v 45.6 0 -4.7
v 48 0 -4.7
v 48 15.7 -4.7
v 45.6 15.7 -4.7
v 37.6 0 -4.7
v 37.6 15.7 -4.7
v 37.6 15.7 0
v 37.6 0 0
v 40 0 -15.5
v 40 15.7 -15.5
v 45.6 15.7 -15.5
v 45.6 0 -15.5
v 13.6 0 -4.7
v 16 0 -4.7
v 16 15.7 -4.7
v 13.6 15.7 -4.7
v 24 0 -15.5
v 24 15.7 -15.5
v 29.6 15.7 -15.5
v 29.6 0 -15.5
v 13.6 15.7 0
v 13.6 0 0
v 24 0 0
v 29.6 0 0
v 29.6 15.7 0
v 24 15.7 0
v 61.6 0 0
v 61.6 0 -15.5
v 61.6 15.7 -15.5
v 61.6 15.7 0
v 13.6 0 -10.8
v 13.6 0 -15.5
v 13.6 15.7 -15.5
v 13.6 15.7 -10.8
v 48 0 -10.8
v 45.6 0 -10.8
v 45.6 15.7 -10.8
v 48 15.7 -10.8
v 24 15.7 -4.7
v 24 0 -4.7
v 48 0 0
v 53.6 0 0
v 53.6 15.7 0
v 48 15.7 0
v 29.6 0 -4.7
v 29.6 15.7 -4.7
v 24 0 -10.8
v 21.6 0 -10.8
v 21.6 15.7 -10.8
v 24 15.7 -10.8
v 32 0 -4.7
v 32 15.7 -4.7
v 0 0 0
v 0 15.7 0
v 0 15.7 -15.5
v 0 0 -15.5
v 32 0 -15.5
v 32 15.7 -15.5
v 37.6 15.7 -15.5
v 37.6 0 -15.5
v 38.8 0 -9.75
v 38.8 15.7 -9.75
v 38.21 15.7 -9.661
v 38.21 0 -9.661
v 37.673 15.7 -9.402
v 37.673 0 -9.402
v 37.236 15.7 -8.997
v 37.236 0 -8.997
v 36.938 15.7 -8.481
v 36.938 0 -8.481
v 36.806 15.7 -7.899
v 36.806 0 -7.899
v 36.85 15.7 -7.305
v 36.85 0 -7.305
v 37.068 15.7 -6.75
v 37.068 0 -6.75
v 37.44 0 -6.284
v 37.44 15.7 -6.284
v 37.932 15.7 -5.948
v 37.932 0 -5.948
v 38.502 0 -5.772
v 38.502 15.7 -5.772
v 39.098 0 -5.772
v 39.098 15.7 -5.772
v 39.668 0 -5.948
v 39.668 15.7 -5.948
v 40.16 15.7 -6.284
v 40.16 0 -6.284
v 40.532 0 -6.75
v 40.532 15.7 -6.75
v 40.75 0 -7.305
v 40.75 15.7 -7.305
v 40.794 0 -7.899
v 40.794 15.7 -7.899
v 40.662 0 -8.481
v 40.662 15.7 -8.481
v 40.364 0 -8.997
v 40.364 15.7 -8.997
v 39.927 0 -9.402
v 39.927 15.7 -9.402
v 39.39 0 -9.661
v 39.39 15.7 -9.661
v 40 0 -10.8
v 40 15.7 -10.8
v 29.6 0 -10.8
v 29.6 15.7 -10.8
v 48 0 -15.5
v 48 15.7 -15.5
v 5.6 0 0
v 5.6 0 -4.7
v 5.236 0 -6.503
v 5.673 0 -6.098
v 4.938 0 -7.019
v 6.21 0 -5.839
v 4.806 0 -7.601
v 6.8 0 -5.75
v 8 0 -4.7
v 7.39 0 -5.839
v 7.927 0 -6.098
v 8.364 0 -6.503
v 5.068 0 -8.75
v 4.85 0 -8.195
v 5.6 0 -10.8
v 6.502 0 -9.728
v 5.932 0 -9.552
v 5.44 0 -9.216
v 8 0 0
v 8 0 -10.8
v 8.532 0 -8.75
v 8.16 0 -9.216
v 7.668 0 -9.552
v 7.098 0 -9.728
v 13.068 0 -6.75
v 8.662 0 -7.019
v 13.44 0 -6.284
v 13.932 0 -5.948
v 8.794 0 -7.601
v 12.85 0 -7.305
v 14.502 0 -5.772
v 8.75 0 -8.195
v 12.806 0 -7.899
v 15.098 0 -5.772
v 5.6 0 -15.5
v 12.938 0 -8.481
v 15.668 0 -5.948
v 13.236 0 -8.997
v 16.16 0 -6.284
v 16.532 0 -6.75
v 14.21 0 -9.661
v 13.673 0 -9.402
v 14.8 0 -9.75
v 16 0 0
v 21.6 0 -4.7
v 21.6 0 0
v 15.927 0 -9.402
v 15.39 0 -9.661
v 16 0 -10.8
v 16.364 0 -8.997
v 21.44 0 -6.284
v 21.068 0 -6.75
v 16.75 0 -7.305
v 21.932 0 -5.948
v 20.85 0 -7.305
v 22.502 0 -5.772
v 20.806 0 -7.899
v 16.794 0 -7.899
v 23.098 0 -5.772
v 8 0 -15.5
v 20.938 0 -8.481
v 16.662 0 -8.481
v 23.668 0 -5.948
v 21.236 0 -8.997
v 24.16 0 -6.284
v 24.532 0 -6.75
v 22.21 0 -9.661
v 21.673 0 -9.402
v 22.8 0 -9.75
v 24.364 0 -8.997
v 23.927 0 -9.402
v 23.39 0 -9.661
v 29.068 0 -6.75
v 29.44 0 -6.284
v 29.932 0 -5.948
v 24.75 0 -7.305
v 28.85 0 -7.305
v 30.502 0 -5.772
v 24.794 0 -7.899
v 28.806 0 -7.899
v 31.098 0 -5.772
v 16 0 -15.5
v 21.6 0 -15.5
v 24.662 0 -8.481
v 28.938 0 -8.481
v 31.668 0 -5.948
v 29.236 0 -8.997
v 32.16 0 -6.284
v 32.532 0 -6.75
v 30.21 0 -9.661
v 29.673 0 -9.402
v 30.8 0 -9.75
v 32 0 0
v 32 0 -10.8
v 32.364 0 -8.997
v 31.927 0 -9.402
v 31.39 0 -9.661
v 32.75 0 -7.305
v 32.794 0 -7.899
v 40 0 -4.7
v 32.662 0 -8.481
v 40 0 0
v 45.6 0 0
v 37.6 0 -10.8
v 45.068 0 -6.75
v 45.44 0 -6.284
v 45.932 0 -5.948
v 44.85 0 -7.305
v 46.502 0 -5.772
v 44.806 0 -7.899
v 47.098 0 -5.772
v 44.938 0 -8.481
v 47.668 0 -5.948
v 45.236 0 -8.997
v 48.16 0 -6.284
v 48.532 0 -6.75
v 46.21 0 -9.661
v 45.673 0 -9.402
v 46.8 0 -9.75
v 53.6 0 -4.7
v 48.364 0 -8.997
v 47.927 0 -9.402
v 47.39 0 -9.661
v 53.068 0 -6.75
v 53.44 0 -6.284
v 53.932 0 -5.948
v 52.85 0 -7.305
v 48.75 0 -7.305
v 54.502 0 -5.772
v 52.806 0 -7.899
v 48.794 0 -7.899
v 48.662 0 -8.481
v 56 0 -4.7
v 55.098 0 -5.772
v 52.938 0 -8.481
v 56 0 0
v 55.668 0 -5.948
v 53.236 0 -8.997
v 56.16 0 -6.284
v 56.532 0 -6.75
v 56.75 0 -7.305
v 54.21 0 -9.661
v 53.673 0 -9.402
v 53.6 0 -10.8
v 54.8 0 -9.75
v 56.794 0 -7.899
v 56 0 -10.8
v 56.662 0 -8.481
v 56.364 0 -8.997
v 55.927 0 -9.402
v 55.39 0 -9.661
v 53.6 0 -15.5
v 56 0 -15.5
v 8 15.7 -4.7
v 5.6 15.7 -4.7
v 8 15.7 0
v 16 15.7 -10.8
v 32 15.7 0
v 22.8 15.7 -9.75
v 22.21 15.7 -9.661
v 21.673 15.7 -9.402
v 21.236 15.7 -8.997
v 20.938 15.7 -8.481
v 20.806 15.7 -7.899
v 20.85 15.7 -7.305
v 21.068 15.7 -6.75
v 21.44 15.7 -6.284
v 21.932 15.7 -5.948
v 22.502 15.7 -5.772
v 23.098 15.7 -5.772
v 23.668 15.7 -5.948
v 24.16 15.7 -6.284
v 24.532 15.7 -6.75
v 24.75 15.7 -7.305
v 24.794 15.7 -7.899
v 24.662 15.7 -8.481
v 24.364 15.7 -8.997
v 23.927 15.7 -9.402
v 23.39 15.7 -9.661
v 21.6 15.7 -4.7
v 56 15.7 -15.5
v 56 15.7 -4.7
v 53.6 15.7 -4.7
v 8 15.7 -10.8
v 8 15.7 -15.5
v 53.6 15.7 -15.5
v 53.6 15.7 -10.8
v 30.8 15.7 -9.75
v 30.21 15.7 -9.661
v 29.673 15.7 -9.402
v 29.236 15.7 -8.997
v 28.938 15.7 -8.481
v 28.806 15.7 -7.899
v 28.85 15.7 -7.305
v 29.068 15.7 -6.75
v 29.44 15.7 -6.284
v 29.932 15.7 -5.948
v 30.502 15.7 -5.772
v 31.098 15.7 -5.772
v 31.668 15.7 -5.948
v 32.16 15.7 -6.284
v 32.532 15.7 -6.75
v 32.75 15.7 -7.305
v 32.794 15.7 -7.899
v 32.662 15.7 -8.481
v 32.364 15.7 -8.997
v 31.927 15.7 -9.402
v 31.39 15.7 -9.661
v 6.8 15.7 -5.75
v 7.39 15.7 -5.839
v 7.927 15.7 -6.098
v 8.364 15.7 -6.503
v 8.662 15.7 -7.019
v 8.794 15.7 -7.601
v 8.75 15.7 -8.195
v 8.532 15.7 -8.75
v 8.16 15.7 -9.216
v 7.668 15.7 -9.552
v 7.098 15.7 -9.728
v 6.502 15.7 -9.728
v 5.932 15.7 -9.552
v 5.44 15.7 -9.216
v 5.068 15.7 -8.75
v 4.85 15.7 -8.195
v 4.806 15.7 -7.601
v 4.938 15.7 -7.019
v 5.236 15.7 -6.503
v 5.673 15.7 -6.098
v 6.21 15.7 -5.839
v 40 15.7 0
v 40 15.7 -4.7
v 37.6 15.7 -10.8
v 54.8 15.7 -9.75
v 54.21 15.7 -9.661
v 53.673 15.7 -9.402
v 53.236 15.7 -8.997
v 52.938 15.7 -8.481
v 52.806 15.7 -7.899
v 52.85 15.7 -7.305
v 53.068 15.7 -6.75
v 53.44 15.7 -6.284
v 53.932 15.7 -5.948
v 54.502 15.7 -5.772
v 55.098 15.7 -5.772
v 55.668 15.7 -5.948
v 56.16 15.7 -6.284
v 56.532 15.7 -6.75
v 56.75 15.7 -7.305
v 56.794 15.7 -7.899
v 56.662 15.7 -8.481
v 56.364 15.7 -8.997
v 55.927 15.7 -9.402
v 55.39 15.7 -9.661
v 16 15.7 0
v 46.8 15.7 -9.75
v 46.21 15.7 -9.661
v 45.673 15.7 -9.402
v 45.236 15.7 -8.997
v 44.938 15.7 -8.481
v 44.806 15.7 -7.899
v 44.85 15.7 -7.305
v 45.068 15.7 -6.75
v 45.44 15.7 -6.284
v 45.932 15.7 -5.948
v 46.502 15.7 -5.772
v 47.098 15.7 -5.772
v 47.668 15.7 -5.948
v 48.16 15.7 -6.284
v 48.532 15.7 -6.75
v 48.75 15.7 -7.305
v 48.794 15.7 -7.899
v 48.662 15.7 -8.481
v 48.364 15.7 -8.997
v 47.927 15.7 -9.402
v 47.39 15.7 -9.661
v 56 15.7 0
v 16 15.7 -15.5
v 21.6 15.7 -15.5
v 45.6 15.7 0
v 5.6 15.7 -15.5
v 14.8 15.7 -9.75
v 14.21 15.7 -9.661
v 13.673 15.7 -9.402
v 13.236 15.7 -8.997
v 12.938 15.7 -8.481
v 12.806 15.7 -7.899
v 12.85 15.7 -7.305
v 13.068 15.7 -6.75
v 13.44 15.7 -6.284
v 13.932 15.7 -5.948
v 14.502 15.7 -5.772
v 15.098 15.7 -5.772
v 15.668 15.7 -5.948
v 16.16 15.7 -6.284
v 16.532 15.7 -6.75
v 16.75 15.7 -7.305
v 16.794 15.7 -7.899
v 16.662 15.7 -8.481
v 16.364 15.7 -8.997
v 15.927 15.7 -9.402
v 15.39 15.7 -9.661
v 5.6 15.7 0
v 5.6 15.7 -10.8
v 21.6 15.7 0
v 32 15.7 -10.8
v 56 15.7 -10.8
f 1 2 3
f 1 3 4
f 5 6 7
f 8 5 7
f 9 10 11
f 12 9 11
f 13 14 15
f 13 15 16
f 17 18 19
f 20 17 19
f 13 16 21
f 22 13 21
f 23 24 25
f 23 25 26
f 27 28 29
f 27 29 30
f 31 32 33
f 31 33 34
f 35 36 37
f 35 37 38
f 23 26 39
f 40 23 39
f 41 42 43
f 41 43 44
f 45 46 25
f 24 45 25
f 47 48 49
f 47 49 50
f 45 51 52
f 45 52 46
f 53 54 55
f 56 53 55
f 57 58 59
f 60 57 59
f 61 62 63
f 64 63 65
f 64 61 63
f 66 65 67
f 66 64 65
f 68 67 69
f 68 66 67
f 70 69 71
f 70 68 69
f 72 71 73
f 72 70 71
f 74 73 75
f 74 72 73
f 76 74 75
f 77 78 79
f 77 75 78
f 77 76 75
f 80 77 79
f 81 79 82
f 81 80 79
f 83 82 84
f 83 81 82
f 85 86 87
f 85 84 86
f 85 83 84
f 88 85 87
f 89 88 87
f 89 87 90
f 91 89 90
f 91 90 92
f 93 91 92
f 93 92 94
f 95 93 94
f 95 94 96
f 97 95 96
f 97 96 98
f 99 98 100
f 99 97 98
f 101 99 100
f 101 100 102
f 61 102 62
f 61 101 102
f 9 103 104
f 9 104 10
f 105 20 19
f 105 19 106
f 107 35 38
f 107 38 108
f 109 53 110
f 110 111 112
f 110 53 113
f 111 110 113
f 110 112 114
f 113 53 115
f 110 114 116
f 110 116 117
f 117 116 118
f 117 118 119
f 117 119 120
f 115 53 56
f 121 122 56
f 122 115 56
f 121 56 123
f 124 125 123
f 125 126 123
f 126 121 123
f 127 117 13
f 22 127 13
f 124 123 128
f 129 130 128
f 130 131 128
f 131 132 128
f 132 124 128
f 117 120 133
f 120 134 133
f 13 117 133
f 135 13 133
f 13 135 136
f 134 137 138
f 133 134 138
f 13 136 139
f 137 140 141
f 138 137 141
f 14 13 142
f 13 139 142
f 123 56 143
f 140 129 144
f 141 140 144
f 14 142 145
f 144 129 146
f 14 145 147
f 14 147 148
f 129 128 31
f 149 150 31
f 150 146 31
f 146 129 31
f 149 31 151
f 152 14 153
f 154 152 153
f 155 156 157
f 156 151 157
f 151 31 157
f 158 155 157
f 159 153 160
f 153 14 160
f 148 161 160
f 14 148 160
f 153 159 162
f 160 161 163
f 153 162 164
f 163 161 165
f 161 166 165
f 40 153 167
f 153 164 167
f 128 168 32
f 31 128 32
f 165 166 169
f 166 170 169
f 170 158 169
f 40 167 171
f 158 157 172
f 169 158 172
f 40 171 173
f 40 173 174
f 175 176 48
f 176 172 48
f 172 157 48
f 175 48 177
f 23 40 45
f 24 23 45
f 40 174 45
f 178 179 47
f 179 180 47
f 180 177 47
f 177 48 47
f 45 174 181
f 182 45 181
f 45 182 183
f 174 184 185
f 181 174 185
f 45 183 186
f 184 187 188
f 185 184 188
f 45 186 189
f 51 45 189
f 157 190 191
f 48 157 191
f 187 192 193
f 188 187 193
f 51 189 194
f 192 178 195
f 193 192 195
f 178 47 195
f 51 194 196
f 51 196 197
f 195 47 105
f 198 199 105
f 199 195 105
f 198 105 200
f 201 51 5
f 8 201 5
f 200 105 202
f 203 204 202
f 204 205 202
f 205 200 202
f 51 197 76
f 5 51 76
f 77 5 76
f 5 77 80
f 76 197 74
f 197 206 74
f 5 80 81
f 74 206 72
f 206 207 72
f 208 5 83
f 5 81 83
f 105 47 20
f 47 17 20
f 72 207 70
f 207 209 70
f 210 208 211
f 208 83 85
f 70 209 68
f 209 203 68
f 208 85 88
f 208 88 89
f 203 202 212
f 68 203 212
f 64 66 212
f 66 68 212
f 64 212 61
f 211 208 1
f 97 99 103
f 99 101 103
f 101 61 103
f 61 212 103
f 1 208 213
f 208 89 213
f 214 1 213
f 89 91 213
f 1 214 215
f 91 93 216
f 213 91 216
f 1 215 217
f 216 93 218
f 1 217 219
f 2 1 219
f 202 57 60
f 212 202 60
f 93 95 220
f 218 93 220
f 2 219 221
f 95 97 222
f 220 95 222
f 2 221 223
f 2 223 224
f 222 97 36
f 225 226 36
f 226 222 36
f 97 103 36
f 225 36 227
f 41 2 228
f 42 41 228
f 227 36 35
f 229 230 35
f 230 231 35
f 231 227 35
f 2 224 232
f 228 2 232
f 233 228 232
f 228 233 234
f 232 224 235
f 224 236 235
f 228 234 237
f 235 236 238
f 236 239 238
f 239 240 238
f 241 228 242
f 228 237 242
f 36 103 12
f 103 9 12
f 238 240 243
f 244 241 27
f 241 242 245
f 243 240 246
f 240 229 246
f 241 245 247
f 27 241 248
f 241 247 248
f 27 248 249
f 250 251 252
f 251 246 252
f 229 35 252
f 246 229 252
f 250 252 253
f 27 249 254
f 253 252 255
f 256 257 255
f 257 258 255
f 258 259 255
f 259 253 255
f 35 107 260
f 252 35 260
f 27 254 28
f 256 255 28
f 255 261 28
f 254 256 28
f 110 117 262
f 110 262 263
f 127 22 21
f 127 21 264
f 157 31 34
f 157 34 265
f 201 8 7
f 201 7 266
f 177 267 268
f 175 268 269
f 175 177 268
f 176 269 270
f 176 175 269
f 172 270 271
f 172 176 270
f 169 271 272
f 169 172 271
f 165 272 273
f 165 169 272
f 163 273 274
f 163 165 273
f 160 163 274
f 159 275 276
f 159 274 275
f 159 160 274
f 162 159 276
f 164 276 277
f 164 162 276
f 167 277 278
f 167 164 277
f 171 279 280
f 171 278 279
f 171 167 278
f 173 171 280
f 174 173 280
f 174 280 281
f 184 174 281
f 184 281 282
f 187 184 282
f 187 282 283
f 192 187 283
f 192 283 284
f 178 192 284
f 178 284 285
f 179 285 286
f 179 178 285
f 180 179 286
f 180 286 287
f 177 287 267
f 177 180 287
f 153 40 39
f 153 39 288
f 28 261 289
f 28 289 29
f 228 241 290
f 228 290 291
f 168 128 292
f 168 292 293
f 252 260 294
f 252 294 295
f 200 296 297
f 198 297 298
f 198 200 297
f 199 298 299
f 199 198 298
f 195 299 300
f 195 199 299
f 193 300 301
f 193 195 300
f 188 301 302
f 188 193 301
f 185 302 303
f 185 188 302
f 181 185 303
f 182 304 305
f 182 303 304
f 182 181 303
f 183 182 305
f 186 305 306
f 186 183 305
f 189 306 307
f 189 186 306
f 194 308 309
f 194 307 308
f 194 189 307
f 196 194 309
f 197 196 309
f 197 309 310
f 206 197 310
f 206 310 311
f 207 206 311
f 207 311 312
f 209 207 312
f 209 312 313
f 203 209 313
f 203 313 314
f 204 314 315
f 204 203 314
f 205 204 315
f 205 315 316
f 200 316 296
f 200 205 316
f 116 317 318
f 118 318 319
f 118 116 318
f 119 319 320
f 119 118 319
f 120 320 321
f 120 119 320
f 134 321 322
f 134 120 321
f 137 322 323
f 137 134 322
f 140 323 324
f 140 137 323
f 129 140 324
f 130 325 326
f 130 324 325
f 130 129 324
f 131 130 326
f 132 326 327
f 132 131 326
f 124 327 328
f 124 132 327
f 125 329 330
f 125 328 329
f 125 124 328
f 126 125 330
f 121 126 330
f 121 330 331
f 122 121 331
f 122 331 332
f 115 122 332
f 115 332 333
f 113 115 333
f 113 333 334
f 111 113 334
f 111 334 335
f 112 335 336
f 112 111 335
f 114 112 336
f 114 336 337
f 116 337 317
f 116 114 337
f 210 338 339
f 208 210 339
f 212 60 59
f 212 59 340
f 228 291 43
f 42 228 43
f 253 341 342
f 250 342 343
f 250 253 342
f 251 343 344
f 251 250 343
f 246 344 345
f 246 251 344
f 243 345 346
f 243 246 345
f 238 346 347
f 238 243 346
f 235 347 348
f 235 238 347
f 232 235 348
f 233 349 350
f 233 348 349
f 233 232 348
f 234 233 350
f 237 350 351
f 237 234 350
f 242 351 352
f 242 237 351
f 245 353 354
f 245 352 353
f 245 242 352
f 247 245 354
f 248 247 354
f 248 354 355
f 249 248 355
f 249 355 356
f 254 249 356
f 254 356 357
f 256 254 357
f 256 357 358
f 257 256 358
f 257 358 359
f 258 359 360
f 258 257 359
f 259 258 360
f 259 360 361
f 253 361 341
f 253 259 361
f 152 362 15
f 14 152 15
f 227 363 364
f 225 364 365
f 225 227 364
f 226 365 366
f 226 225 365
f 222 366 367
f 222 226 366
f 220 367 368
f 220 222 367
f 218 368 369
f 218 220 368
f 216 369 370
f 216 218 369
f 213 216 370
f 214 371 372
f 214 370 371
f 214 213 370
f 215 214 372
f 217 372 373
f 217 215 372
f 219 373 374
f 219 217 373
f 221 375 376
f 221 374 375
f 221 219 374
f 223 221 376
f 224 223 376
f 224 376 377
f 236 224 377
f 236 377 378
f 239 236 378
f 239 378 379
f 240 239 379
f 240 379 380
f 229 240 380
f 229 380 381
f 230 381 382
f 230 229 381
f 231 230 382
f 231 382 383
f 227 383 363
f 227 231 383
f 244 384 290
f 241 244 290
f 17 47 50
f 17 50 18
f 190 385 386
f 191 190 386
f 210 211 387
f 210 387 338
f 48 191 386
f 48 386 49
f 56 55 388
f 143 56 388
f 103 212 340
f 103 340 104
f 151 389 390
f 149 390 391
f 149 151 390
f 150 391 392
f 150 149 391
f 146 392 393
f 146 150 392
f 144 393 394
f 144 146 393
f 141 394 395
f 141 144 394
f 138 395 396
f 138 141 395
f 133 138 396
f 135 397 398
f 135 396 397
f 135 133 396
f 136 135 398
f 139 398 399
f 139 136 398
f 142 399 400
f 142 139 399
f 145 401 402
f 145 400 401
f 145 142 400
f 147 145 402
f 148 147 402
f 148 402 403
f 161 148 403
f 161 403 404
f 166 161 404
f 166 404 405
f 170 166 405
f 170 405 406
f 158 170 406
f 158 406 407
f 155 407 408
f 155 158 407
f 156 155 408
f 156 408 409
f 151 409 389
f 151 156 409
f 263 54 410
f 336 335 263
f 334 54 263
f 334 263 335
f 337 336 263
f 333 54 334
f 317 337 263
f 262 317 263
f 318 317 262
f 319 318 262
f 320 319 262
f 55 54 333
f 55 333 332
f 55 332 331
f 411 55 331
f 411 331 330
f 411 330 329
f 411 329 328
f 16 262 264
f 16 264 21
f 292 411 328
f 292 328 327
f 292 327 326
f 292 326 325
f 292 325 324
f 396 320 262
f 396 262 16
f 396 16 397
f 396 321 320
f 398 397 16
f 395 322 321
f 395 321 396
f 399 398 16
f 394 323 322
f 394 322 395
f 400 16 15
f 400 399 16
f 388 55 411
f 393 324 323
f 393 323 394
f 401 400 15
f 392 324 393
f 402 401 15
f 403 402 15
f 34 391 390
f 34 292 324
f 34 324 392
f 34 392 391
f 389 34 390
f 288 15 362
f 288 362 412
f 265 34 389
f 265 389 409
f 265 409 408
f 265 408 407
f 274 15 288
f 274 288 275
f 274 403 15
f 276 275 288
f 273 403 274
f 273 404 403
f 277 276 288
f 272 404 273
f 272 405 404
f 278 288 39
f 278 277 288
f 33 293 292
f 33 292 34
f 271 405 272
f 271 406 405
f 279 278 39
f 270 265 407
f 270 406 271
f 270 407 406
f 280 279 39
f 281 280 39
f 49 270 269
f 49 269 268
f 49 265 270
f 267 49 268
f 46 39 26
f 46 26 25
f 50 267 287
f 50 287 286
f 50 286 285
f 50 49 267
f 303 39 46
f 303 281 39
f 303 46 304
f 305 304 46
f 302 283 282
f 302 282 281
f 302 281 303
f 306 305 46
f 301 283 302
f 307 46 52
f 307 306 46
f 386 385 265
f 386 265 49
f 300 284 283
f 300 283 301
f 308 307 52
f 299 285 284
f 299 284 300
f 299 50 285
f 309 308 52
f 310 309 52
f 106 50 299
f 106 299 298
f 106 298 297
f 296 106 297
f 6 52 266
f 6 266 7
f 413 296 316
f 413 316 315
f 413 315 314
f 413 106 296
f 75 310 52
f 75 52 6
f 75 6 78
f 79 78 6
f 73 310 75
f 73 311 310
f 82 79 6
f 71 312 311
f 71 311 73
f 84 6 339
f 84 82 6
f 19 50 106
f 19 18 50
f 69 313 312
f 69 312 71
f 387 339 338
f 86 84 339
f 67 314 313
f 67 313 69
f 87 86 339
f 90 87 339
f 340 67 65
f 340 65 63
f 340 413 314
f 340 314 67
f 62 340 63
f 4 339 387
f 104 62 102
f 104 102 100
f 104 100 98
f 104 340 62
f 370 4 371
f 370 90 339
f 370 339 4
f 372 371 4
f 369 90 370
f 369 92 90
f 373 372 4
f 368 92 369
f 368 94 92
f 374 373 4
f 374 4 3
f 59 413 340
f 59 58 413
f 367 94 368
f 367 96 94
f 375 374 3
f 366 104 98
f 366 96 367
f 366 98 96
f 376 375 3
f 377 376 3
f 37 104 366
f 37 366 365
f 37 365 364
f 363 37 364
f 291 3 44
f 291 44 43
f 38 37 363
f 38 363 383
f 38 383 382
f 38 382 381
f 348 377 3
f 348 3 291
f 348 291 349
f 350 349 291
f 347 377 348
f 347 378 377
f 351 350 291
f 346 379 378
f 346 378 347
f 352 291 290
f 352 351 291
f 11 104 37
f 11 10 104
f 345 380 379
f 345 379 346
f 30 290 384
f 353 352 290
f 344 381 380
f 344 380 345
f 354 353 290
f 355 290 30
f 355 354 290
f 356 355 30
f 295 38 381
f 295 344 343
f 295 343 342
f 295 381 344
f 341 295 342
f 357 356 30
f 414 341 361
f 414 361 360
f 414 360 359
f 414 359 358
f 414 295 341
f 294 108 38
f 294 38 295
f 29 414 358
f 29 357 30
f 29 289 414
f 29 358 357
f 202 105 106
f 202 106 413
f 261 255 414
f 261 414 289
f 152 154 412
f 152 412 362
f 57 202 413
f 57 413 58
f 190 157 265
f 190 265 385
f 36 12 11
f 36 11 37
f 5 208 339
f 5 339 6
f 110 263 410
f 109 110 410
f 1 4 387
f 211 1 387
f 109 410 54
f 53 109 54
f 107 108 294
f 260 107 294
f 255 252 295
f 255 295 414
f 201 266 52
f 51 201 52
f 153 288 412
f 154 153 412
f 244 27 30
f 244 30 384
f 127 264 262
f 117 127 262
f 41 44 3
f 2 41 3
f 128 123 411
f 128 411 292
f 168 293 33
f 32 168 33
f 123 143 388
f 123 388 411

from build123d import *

# Parameters (mm, degrees)
BOSS_EXTRUDE1_DEPTH = 15.7
LPATTERN1_COUNT     = 8
LPATTERN1_PITCH     = 8
SKETCH2_W           = 1.2
SKETCH2_H           = 6.1
CUT_EXTRUDE1_DEPTH  = 67.562602113
SKETCH3_W           = 0.8
SKETCH3_H           = 3.2
BOSS_EXTRUDE2_DEPTH = 15.7


with BuildPart() as part:
    # Sketch1 → Boss-Extrude1 (new body)
    with BuildSketch(Plane(origin=(0, 0, 0), x_dir=(1, 0, 0), z_dir=(0, 1, 0))):
        with BuildLine():
            Line((0, 10.8), (0, 15.5))
            Line((0, 15.5), (5.6, 15.5))
            Line((5.6, 15.5), (5.6, 10.8))
            Line((5.6, 10.8), (6.8, 10.8))
            Line((6.8, 10.8), (6.8, 9.75))
            ThreePointArc((6.8, 9.75), (4.8, 7.75), (6.8, 5.75))
            Line((6.8, 5.75), (6.8, 4.7))
            Line((6.8, 4.7), (5.6, 4.7))
            Line((5.6, 4.7), (5.6, 0))
            Line((5.6, 0), (0, 0))
            Line((0, 0), (0, 4.7))
            Line((0, 4.7), (-1.2, 4.7))
            Line((-1.2, 4.7), (-1.2, 5.75))
            ThreePointArc((-1.2, 5.75), (0.8, 7.75), (-1.2, 9.75))
            Line((-1.2, 9.75), (-1.2, 10.8))
            Line((-1.2, 10.8), (0, 10.8))
        make_face()
    boss_extrude1 = extrude(amount=BOSS_EXTRUDE1_DEPTH)

    # LPattern1: Boss-Extrude1 ×8
    with Locations(*[(i * LPATTERN1_PITCH, 0, 0) for i in range(1, LPATTERN1_COUNT)]):
        add(boss_extrude1)

    # Sketch2 → Cut-Extrude1 (cut, through all)
    with BuildSketch(Plane(origin=(0, 15.7, 0), x_dir=(1, 0, 0), z_dir=(0, 1, 0))):
        with Locations((-0.6, 7.75)):
            Rectangle(SKETCH2_W, SKETCH2_H)
        with Locations((62.2, 7.75)):
            Rectangle(SKETCH2_W, SKETCH2_H)
    extrude(amount=-CUT_EXTRUDE1_DEPTH, mode=Mode.SUBTRACT)

    # Sketch3 → Boss-Extrude2 (add)
    with BuildSketch(Plane(origin=(0, 15.7, 0), x_dir=(1, 0, 0), z_dir=(0, 1, 0))):
        with Locations((0.4, 7.75)):
            Rectangle(SKETCH3_W, SKETCH3_H)
        with Locations((61.2, 7.75)):
            Rectangle(SKETCH3_W, SKETCH3_H)
    extrude(amount=-BOSS_EXTRUDE2_DEPTH)


solid = part.part
